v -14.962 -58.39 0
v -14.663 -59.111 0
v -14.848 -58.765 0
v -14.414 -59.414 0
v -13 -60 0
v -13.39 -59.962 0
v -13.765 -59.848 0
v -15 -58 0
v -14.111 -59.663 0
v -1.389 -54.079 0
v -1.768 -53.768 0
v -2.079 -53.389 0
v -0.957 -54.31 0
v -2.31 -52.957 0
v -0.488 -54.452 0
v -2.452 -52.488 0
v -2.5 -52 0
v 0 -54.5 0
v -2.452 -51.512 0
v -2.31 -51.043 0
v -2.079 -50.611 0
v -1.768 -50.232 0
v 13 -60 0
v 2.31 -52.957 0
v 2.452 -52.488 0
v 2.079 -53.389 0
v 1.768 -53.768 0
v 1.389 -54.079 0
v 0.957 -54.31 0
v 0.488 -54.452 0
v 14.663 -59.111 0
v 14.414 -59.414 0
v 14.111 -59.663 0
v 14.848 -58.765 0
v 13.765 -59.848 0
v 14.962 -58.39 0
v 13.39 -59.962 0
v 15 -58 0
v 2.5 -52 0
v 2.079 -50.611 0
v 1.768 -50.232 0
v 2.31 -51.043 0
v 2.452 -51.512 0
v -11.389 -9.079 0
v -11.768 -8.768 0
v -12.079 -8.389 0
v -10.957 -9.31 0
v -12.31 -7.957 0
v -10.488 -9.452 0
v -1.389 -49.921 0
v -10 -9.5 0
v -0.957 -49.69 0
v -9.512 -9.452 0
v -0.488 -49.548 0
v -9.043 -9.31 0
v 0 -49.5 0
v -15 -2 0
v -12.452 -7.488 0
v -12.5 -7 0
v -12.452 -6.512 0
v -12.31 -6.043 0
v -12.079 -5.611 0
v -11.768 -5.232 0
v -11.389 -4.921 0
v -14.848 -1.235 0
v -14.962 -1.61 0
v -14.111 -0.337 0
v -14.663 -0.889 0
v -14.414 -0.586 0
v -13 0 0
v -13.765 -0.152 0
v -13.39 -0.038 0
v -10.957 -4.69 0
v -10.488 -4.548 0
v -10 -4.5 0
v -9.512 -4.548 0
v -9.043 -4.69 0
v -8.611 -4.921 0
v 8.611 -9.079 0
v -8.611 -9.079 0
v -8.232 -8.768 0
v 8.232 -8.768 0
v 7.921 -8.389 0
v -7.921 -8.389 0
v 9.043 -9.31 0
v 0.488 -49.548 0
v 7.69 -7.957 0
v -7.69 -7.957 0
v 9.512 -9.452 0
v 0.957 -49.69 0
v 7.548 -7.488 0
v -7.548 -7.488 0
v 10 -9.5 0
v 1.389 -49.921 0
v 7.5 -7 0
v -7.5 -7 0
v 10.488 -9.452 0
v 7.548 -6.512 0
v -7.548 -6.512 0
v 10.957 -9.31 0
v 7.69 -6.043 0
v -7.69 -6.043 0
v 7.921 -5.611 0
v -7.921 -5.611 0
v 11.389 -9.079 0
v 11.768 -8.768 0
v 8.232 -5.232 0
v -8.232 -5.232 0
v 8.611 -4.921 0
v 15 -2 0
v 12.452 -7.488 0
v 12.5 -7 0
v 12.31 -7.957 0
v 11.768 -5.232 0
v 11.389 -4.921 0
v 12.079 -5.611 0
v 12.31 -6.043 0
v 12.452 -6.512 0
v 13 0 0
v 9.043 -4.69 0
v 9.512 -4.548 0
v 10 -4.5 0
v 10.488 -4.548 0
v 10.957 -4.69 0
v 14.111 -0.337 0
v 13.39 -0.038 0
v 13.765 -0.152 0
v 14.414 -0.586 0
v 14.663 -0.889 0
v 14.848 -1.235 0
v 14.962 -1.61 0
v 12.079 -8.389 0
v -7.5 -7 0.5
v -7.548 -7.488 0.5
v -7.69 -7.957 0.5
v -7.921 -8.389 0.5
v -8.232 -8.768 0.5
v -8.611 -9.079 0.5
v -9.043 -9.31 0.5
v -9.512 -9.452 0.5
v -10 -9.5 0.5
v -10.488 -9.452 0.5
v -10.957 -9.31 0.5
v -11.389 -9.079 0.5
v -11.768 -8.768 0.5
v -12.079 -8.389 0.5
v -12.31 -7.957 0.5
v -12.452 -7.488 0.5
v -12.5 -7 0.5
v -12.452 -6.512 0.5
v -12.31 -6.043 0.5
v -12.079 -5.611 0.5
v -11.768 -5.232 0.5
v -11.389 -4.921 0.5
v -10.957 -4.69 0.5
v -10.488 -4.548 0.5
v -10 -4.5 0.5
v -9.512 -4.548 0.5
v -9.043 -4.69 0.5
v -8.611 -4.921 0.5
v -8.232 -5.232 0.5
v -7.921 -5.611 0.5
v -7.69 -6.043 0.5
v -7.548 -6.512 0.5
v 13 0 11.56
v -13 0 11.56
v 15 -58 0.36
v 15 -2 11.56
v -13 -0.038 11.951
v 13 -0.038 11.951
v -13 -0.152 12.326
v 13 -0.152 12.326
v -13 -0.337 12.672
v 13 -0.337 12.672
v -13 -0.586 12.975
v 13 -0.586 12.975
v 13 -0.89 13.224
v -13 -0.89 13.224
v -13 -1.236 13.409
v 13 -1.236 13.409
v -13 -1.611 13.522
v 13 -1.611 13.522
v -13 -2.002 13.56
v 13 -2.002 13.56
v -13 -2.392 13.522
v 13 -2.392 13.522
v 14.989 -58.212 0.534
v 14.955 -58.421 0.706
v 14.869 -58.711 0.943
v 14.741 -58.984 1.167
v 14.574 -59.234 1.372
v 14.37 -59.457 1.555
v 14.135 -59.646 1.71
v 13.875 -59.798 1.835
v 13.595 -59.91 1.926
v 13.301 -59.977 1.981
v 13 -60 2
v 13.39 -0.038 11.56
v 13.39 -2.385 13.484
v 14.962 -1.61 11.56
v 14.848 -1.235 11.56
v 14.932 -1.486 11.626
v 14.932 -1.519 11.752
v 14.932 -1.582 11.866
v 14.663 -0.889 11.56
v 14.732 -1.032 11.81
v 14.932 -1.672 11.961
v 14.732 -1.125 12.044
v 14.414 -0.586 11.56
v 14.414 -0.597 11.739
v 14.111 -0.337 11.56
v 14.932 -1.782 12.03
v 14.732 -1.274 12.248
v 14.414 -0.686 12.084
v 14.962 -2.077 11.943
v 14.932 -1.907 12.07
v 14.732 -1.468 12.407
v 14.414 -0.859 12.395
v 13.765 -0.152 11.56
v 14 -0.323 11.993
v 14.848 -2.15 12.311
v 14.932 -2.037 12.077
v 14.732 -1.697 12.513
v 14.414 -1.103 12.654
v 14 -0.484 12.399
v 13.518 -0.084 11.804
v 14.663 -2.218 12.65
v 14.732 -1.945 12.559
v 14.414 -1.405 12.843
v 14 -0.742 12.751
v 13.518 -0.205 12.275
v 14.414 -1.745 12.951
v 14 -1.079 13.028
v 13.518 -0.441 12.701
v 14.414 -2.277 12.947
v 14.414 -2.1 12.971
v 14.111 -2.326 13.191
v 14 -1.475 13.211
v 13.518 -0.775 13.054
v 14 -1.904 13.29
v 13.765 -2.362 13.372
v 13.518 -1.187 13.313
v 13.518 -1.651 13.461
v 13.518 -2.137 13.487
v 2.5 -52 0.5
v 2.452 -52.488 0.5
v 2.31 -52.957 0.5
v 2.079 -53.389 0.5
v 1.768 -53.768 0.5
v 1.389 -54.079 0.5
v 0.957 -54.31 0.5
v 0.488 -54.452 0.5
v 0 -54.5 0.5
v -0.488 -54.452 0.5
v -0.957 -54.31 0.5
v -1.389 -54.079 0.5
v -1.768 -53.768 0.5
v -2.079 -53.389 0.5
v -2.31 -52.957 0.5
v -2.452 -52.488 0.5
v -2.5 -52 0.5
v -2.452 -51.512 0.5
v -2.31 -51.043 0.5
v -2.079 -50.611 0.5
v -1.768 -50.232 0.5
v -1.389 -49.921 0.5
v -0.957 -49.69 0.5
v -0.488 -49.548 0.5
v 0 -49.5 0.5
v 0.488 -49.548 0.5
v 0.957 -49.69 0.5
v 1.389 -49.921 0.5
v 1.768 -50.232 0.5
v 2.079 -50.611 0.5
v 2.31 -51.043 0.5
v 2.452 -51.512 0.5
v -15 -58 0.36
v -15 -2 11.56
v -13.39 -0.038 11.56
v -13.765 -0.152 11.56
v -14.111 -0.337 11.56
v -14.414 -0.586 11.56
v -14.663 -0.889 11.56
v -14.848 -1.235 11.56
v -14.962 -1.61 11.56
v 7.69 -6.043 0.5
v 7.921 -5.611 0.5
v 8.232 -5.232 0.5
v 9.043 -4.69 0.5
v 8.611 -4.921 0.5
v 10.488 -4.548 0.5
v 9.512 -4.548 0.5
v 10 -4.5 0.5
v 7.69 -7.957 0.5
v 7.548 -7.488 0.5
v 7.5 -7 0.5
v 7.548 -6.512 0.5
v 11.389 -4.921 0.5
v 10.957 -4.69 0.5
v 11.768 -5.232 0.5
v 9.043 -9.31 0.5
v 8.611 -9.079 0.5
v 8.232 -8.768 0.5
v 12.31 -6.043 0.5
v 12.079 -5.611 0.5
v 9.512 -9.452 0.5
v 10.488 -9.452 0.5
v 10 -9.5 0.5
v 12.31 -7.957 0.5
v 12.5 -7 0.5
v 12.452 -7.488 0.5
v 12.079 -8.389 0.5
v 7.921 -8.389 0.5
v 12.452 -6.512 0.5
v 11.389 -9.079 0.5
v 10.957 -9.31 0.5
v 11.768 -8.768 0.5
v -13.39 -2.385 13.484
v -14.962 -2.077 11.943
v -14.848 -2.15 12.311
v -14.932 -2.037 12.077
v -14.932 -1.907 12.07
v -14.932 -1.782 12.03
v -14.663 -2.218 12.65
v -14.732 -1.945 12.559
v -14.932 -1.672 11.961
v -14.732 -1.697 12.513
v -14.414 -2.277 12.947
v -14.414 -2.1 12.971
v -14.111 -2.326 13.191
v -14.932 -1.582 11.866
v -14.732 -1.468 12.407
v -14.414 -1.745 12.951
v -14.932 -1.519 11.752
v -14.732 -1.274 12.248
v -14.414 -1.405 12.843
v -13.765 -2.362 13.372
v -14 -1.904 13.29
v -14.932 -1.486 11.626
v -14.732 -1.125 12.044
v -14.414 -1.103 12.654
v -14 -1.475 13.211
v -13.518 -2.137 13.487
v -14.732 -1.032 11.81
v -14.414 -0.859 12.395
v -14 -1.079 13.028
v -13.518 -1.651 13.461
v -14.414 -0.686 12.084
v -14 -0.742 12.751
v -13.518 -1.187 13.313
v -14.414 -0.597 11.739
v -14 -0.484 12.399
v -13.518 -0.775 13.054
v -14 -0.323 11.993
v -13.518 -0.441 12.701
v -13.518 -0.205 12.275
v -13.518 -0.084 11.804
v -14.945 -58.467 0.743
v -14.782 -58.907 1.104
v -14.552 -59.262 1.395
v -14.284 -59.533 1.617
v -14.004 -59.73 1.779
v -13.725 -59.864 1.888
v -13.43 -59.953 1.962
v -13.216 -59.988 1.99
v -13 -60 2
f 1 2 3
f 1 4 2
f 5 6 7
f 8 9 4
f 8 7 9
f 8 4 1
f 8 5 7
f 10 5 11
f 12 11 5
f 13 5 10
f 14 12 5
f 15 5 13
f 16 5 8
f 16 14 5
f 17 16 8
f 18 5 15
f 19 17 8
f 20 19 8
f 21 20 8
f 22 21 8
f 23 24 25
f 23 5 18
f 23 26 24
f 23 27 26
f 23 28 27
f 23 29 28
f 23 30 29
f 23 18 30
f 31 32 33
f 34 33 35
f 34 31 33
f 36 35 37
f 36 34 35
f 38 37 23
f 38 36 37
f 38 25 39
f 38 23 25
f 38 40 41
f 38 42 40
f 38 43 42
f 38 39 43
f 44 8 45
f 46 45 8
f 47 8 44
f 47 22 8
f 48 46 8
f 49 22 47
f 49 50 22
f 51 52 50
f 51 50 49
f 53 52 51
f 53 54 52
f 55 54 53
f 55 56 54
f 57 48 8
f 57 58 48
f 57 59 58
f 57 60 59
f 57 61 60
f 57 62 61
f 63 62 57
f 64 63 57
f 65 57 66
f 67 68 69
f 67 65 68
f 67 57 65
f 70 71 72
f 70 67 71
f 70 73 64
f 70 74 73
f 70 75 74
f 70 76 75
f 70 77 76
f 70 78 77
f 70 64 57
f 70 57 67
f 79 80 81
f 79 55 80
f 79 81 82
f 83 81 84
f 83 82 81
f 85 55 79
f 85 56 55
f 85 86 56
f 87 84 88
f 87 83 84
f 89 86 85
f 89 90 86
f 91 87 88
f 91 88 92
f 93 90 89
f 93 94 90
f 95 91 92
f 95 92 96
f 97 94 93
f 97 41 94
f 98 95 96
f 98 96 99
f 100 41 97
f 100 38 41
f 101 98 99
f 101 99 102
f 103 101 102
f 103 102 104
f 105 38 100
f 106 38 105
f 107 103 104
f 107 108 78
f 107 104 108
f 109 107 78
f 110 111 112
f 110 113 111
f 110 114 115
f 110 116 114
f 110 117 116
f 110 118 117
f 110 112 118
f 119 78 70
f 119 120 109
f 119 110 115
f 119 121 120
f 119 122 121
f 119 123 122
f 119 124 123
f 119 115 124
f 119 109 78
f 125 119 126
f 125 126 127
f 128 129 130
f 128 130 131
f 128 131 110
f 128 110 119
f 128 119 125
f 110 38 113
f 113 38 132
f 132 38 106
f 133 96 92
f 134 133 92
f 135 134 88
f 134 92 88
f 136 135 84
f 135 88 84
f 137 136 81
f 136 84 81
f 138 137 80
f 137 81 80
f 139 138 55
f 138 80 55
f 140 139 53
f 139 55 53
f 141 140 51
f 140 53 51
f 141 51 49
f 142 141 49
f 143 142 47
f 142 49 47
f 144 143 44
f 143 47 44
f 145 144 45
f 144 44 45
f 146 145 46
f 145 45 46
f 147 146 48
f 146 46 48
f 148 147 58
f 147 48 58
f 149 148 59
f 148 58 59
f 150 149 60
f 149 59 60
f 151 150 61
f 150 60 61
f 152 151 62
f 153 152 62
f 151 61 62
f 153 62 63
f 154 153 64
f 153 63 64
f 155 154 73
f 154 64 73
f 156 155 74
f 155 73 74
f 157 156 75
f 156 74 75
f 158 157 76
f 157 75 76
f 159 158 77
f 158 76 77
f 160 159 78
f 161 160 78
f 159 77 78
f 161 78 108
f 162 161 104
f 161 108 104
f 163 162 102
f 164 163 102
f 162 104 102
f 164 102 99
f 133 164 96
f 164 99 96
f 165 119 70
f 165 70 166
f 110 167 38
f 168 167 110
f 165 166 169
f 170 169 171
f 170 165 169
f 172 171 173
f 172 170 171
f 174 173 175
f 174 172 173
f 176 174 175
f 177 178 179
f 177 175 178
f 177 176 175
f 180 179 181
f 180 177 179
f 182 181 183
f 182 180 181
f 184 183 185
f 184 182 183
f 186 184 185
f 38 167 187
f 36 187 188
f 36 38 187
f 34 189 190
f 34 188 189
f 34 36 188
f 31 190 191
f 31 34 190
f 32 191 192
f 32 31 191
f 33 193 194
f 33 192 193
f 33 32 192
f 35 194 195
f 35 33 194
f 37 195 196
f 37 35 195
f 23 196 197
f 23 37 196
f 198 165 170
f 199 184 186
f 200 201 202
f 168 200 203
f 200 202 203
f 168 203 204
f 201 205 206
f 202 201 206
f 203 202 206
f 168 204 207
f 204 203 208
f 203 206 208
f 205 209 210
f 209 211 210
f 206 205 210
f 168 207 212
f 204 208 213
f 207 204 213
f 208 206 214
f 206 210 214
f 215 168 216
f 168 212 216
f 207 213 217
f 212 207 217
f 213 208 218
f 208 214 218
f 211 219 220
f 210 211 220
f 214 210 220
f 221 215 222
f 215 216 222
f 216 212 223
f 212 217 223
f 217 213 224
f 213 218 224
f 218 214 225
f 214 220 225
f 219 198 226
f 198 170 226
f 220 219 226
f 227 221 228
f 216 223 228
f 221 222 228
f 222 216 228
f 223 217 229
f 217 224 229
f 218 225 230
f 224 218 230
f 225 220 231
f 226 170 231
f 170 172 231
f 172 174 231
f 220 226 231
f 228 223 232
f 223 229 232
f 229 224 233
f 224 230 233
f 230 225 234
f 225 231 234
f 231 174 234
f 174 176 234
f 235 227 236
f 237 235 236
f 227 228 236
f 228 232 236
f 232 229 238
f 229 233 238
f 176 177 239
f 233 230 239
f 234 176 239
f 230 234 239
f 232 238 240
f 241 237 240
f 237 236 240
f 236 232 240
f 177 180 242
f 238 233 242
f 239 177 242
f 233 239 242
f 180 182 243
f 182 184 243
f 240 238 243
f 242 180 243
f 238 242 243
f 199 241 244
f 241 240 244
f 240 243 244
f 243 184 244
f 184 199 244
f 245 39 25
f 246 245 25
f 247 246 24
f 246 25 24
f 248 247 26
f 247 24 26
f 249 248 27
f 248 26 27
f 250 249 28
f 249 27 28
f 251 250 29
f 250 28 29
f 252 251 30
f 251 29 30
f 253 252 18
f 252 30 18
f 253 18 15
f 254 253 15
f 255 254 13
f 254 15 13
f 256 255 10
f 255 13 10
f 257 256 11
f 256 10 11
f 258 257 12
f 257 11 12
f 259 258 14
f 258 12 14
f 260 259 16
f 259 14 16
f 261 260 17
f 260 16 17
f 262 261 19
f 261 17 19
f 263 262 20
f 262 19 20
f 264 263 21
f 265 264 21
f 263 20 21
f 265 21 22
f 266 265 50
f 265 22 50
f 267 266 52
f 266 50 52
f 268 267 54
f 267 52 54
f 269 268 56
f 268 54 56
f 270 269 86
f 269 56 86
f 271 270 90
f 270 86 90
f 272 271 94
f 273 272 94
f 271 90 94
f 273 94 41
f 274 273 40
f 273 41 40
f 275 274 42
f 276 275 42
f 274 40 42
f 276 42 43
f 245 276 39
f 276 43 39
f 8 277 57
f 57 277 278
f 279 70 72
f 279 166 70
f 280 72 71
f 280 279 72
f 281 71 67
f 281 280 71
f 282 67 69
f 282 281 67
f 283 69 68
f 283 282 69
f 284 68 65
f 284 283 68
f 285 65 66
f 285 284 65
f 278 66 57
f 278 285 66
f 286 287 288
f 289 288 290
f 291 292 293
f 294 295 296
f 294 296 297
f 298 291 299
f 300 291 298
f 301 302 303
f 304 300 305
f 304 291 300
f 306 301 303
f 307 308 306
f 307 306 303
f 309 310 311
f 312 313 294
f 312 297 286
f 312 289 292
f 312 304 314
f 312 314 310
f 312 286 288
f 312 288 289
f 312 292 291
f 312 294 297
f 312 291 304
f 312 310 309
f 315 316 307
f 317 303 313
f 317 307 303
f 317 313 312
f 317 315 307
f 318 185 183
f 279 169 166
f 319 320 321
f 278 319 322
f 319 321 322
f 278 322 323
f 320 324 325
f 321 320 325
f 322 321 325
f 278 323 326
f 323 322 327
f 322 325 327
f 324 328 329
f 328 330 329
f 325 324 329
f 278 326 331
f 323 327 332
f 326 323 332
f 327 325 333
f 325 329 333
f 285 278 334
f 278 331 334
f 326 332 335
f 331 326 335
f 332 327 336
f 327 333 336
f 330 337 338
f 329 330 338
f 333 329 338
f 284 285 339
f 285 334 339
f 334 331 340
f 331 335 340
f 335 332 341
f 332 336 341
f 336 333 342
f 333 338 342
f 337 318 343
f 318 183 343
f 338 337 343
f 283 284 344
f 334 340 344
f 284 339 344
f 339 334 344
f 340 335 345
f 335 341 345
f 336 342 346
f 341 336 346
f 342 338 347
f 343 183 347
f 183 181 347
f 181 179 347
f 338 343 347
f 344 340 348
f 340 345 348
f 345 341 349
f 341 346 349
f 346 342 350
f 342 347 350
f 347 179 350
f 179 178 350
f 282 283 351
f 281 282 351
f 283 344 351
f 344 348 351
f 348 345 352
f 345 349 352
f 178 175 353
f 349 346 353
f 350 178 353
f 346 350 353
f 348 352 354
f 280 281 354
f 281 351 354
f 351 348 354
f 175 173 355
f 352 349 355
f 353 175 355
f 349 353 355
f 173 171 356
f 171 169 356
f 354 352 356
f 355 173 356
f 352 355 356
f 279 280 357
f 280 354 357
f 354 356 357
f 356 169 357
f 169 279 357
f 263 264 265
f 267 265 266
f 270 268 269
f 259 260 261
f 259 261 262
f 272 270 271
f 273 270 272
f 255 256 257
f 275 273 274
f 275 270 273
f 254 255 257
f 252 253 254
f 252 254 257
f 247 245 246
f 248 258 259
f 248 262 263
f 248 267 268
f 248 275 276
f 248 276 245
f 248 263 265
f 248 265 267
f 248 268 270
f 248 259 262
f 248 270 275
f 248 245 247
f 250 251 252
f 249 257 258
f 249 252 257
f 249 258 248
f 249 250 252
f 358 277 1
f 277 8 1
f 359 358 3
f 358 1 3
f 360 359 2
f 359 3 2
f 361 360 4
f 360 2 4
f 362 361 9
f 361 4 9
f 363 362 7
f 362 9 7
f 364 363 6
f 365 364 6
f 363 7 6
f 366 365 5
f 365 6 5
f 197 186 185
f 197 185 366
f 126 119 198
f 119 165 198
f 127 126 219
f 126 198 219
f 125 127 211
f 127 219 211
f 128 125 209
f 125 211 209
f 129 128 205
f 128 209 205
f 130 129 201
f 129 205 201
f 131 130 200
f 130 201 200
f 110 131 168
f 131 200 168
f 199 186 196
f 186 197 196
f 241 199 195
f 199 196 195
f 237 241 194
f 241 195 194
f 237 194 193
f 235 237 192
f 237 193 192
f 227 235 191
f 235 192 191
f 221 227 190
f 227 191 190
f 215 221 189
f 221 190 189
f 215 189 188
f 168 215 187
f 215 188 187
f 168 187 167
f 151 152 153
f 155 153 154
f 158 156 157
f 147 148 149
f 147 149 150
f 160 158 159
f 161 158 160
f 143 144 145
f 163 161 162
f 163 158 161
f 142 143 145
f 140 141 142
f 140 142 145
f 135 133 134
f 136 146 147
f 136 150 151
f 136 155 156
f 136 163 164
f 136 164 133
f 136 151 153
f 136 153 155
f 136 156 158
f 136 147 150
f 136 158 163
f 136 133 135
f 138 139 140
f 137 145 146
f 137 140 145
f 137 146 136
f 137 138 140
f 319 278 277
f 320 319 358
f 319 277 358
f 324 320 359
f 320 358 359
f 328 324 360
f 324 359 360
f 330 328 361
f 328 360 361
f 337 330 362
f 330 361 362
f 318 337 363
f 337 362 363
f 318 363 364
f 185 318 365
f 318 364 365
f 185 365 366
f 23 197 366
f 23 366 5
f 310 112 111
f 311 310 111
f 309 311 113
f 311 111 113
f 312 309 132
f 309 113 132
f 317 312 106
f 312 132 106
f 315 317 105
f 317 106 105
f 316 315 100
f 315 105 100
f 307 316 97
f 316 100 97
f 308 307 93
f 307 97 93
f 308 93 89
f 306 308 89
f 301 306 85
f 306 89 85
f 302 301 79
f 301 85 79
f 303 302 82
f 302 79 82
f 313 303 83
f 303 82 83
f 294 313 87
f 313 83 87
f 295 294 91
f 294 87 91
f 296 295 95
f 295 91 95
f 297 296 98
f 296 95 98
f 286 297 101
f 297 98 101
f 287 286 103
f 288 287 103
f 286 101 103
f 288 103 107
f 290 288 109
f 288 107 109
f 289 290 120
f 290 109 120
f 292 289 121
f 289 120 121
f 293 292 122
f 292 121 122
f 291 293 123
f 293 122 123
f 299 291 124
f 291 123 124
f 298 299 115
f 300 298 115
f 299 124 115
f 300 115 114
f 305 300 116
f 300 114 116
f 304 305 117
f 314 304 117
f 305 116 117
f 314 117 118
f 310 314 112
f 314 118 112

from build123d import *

# Parameters (mm, degrees)
F1_DEPTH = 15
F2_R     = 2.5
F3_DEPTH = 0.5
F4_R     = 2


with BuildPart() as f1:
    # F0 (on Right) → F1 (new body, symmetric)
    with BuildSketch(Plane.YZ):
        Polygon((0, 0), (0, 14), (-60, 2), (-60, 0), align=None)
    extrude(amount=F1_DEPTH, both=True)

    # F2 (on face) → F3 (cut)
    with BuildSketch(Plane(origin=(0, 0, 0), x_dir=(1, 0, 0), z_dir=(0, 0, -1))):
        with Locations((0, 52)):
            Circle(F2_R)
        with Locations((10, 7)):
            Circle(F2_R)
        with Locations((-10, 7)):
            Circle(F2_R)
    extrude(amount=-F3_DEPTH, mode=Mode.SUBTRACT)

    # F4
    f4_edges = [f1.edges().sort_by_distance(p)[0] for p in [
        (15, -30, 8),
        (-15, -30, 8),
        (-15, 0, 7),
        (0, 0, 14),
        (15, 0, 7),
        (-15, -60, 1),
        (15, -60, 1),
    ]]
    fillet(f4_edges, radius=F4_R)


solid = f1.part
